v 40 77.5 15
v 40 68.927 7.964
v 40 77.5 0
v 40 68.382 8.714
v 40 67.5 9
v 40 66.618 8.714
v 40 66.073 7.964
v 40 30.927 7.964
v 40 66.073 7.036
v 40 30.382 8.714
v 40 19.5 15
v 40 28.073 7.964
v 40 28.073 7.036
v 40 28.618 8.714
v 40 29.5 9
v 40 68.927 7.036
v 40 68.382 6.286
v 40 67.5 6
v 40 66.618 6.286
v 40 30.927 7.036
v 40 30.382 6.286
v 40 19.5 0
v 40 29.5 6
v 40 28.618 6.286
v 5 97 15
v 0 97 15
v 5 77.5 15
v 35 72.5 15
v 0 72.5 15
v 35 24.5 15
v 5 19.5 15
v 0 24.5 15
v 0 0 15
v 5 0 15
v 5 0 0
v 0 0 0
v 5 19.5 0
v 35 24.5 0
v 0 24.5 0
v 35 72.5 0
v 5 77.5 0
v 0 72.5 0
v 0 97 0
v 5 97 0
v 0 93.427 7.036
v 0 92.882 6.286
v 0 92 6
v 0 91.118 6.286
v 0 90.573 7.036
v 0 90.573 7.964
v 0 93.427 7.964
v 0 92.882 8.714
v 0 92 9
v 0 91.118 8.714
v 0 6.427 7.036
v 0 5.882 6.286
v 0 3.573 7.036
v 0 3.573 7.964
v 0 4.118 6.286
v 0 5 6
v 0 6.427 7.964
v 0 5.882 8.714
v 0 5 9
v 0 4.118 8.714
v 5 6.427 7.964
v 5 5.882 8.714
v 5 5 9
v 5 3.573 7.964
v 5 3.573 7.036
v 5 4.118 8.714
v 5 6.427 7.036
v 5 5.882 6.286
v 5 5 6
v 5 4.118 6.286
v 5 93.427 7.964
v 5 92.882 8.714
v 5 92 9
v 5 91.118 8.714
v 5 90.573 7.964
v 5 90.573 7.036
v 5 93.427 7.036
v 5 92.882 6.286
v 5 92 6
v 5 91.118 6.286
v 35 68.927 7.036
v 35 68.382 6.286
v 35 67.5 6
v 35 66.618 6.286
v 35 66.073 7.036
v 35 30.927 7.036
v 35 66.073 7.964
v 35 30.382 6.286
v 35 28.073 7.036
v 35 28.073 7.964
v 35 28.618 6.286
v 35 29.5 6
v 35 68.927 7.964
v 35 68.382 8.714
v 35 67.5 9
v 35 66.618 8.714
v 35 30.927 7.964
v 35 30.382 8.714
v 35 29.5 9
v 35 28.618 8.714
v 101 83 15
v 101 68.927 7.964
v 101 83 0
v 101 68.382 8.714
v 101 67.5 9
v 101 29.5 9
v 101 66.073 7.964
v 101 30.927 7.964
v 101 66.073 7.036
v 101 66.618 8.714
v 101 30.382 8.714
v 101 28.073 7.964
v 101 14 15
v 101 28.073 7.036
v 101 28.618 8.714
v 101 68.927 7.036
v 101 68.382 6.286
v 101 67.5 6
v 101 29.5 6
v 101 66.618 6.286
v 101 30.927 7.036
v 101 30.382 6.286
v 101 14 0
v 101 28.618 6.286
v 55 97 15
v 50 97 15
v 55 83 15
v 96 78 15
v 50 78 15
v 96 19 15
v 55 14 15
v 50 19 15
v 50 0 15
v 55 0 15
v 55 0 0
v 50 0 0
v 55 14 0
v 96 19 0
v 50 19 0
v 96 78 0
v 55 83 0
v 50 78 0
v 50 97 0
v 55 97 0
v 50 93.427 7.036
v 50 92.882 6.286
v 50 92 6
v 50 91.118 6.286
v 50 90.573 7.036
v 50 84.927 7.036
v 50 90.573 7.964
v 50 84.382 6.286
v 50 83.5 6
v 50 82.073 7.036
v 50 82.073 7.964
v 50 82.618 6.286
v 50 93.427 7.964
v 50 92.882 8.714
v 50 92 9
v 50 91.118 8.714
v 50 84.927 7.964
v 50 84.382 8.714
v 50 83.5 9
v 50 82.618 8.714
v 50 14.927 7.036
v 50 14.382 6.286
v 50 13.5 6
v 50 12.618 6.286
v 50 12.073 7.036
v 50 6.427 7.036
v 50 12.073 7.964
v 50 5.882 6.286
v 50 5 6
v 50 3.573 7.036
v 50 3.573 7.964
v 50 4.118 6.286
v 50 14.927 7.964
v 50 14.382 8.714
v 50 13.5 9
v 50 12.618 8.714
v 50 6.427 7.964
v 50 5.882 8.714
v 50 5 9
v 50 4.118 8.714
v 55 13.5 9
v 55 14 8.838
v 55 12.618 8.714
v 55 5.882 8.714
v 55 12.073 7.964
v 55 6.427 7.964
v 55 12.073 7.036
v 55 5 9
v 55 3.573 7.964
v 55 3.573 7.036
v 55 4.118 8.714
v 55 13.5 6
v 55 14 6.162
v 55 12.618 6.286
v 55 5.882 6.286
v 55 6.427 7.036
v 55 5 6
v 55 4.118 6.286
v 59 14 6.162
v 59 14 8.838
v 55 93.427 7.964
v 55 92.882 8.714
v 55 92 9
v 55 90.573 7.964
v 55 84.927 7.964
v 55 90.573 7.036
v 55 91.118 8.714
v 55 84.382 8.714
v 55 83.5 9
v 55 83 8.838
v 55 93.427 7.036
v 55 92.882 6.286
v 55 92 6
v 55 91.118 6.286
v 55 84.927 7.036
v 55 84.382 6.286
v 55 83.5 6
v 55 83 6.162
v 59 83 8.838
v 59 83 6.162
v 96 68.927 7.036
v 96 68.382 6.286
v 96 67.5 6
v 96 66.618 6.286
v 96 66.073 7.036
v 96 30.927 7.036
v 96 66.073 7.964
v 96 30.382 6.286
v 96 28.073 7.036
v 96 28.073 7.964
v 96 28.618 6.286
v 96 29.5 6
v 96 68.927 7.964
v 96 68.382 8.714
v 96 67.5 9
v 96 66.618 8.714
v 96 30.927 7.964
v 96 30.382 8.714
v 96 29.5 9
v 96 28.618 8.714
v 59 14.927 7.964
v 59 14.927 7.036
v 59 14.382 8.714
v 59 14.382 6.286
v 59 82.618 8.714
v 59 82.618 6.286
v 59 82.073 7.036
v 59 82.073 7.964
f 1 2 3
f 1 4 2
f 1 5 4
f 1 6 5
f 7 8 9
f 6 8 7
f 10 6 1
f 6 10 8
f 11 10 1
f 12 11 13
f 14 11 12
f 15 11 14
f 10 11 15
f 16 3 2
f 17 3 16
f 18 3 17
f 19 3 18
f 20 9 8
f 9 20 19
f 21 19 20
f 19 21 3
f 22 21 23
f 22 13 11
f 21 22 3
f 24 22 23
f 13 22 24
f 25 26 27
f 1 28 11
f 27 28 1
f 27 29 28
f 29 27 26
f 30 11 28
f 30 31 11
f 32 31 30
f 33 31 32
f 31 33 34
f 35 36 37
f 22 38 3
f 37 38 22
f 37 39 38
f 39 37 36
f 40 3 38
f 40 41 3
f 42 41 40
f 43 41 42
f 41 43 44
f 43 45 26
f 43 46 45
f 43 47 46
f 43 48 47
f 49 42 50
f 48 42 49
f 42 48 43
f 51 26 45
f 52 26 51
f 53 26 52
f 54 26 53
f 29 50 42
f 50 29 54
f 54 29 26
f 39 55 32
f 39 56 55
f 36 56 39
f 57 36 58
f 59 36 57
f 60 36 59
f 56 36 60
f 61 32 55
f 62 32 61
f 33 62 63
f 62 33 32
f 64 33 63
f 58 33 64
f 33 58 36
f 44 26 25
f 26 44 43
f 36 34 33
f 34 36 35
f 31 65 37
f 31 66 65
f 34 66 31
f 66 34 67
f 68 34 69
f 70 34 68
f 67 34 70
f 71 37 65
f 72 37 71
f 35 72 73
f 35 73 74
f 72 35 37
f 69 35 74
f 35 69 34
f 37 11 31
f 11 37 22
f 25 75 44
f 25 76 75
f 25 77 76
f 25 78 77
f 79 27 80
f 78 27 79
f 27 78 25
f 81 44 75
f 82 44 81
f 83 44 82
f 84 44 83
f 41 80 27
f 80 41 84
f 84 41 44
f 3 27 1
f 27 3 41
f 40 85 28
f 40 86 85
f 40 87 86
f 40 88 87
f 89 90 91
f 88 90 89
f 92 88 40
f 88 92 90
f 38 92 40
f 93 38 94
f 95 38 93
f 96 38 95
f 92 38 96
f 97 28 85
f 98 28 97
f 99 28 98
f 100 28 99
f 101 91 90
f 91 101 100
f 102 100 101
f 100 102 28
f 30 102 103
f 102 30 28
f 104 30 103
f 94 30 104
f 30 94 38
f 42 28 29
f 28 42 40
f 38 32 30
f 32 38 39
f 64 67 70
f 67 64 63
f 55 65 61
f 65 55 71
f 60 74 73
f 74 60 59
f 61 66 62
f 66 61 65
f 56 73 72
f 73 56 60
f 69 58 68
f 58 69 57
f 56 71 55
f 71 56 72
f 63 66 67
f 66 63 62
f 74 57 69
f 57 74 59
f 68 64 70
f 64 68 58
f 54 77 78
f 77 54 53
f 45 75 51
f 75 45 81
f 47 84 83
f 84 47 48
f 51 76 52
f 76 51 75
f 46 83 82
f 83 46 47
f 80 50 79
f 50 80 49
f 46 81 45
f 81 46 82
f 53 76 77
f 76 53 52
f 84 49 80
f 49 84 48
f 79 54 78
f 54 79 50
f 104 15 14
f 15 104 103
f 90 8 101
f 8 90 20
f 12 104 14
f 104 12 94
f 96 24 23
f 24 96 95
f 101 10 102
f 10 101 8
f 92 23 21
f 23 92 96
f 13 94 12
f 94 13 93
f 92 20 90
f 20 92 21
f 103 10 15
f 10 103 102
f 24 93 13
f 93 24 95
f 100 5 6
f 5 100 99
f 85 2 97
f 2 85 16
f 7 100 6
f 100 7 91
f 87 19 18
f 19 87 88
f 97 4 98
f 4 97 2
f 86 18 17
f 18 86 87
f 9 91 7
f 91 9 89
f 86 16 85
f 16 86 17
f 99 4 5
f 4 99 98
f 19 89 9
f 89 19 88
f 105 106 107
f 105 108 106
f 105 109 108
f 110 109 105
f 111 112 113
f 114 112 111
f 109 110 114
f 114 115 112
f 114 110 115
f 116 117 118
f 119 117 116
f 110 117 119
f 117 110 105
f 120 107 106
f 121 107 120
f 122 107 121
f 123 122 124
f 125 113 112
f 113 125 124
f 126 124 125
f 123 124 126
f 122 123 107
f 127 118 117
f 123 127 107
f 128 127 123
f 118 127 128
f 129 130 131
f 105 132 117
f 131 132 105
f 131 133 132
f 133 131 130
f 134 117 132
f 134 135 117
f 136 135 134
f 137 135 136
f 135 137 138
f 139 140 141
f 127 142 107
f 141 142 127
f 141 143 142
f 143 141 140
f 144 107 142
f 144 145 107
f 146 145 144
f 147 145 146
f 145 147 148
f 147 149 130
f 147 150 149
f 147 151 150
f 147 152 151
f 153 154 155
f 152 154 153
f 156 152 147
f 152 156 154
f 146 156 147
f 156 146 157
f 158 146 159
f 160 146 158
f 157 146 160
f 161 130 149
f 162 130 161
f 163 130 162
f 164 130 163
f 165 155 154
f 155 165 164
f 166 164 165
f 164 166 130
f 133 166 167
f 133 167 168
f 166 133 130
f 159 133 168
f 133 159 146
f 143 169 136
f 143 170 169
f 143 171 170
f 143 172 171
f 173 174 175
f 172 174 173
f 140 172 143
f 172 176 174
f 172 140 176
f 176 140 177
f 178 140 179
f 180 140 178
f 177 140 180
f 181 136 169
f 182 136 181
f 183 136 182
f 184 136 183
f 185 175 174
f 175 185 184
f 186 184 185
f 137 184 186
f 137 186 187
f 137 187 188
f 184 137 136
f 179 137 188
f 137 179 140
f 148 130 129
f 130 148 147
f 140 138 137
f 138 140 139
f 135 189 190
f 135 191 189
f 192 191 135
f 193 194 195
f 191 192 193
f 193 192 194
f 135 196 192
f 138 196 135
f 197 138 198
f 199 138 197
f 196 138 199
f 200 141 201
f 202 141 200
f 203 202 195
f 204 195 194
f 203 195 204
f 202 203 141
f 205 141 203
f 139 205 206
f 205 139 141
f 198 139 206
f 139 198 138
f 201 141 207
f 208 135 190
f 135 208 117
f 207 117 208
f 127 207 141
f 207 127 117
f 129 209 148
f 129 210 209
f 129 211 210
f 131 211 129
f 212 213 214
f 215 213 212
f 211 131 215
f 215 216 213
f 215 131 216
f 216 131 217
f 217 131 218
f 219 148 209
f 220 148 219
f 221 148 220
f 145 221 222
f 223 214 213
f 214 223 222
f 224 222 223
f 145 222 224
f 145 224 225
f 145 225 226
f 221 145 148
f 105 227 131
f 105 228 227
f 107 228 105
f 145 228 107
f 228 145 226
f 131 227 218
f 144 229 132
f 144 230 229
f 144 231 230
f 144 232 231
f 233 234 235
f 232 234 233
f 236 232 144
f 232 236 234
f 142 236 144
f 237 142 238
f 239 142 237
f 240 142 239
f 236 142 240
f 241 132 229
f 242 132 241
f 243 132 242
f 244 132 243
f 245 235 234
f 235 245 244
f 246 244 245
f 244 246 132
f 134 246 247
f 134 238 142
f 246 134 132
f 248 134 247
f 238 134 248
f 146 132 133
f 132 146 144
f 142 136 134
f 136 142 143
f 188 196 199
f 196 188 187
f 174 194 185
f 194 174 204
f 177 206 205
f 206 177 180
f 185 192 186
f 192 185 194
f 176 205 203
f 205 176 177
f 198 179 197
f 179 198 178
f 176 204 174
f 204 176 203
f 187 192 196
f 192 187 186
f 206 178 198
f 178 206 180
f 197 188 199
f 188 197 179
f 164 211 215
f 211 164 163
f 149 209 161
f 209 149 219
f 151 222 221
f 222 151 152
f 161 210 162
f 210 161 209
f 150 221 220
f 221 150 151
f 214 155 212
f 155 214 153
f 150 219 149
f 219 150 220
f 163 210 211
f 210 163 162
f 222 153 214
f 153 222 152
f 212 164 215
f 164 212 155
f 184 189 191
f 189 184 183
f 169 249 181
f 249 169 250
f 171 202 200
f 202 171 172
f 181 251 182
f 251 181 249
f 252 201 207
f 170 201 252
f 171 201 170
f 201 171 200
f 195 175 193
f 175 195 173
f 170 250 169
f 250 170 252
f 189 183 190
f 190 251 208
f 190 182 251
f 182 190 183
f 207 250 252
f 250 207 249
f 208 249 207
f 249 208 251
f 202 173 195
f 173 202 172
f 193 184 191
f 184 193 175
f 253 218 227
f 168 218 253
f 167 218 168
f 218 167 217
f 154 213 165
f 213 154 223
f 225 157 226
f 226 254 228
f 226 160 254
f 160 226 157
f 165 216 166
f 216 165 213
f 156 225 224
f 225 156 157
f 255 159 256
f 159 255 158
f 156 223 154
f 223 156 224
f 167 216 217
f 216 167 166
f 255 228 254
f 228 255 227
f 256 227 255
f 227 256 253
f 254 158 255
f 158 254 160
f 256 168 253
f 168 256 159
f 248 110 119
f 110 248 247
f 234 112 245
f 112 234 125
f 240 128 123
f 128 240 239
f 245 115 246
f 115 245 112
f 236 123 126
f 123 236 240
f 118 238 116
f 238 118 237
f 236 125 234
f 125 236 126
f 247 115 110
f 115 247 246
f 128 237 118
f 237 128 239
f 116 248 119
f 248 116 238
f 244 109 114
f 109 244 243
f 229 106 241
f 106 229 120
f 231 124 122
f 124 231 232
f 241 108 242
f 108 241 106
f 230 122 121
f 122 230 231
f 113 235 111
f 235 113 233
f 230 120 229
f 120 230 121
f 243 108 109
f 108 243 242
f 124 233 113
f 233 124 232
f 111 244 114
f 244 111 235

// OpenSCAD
difference()
{
	cube([40,97,15]);
	
	translate([5,0,0])	cube([35,(97-58)/2,15]);
	translate([5,97-(97-58)/2,0])	cube([35,(97-58)/2,15]);
	translate([0,(97-48)/2,0])	cube([35,48,15]);

	// holes
	translate([-1,5,7.5]) rotate([0,90,0])
	cylinder(h=7, r=1.5, $fn=10);
	translate([-1,97-5,7.5]) rotate([0,90,0])
	cylinder(h=7, r=1.5, $fn=10);

	translate([34,(97-48)/2+5,7.5]) rotate([0,90,0])
	cylinder(h=7, r=1.5, $fn=10);
	translate([34,(97-48)/2+43,7.5]) rotate([0,90,0])
	cylinder(h=7, r=1.5, $fn=10);
}

translate([50,0,0])
{
	union()
	{	
		difference()
		{
			cube([51,97,15]);
			
			translate([5,0,0])	cube([50,(97-69)/2,15]);
			translate([5,97-(97-69)/2,0])	cube([50,(97-68)/2,15]);
			translate([0,(97-59)/2,0])	cube([46,59,15]);
	
		
			// holes
			translate([-1,5,7.5]) rotate([0,90,0])
			cylinder(h=7, r=1.5, $fn=10);
			translate([-1,97-5,7.5]) rotate([0,90,0])
			cylinder(h=7, r=1.5, $fn=10);
			
			translate([-1,13.5,7.5]) rotate([0,90,0])
			cylinder(h=10, r=1.5, $fn=10);
			translate([-1,97-13.5,7.5]) rotate([0,90,0])
			cylinder(h=10, r=1.5, $fn=10);

			translate([45,(97-48)/2+5,7.5]) rotate([0,90,0])
			cylinder(h=7, r=1.5, $fn=10);
			translate([45,(97-48)/2+43,7.5]) rotate([0,90,0])
			cylinder(h=7, r=1.5, $fn=10);
		
		}
//		difference()
//		{
//			translate([35,(97-58)/2,0]) cube([5,5,20]);
//			translate([34,(97-58)/2+2.5,17.5]) rotate([0,90,0])
//			cylinder(h=7, r=1.5, $fn=10);
//		}
//		difference()
//		{
//			translate([35,97-(97-58)/2-5,0]) cube([5,5,20]);
//			translate([34,97-(97-58)/2-2.5,17.5]) rotate([0,90,0])
//			cylinder(h=7, r=1.5, $fn=10);
//		}
	}
}
